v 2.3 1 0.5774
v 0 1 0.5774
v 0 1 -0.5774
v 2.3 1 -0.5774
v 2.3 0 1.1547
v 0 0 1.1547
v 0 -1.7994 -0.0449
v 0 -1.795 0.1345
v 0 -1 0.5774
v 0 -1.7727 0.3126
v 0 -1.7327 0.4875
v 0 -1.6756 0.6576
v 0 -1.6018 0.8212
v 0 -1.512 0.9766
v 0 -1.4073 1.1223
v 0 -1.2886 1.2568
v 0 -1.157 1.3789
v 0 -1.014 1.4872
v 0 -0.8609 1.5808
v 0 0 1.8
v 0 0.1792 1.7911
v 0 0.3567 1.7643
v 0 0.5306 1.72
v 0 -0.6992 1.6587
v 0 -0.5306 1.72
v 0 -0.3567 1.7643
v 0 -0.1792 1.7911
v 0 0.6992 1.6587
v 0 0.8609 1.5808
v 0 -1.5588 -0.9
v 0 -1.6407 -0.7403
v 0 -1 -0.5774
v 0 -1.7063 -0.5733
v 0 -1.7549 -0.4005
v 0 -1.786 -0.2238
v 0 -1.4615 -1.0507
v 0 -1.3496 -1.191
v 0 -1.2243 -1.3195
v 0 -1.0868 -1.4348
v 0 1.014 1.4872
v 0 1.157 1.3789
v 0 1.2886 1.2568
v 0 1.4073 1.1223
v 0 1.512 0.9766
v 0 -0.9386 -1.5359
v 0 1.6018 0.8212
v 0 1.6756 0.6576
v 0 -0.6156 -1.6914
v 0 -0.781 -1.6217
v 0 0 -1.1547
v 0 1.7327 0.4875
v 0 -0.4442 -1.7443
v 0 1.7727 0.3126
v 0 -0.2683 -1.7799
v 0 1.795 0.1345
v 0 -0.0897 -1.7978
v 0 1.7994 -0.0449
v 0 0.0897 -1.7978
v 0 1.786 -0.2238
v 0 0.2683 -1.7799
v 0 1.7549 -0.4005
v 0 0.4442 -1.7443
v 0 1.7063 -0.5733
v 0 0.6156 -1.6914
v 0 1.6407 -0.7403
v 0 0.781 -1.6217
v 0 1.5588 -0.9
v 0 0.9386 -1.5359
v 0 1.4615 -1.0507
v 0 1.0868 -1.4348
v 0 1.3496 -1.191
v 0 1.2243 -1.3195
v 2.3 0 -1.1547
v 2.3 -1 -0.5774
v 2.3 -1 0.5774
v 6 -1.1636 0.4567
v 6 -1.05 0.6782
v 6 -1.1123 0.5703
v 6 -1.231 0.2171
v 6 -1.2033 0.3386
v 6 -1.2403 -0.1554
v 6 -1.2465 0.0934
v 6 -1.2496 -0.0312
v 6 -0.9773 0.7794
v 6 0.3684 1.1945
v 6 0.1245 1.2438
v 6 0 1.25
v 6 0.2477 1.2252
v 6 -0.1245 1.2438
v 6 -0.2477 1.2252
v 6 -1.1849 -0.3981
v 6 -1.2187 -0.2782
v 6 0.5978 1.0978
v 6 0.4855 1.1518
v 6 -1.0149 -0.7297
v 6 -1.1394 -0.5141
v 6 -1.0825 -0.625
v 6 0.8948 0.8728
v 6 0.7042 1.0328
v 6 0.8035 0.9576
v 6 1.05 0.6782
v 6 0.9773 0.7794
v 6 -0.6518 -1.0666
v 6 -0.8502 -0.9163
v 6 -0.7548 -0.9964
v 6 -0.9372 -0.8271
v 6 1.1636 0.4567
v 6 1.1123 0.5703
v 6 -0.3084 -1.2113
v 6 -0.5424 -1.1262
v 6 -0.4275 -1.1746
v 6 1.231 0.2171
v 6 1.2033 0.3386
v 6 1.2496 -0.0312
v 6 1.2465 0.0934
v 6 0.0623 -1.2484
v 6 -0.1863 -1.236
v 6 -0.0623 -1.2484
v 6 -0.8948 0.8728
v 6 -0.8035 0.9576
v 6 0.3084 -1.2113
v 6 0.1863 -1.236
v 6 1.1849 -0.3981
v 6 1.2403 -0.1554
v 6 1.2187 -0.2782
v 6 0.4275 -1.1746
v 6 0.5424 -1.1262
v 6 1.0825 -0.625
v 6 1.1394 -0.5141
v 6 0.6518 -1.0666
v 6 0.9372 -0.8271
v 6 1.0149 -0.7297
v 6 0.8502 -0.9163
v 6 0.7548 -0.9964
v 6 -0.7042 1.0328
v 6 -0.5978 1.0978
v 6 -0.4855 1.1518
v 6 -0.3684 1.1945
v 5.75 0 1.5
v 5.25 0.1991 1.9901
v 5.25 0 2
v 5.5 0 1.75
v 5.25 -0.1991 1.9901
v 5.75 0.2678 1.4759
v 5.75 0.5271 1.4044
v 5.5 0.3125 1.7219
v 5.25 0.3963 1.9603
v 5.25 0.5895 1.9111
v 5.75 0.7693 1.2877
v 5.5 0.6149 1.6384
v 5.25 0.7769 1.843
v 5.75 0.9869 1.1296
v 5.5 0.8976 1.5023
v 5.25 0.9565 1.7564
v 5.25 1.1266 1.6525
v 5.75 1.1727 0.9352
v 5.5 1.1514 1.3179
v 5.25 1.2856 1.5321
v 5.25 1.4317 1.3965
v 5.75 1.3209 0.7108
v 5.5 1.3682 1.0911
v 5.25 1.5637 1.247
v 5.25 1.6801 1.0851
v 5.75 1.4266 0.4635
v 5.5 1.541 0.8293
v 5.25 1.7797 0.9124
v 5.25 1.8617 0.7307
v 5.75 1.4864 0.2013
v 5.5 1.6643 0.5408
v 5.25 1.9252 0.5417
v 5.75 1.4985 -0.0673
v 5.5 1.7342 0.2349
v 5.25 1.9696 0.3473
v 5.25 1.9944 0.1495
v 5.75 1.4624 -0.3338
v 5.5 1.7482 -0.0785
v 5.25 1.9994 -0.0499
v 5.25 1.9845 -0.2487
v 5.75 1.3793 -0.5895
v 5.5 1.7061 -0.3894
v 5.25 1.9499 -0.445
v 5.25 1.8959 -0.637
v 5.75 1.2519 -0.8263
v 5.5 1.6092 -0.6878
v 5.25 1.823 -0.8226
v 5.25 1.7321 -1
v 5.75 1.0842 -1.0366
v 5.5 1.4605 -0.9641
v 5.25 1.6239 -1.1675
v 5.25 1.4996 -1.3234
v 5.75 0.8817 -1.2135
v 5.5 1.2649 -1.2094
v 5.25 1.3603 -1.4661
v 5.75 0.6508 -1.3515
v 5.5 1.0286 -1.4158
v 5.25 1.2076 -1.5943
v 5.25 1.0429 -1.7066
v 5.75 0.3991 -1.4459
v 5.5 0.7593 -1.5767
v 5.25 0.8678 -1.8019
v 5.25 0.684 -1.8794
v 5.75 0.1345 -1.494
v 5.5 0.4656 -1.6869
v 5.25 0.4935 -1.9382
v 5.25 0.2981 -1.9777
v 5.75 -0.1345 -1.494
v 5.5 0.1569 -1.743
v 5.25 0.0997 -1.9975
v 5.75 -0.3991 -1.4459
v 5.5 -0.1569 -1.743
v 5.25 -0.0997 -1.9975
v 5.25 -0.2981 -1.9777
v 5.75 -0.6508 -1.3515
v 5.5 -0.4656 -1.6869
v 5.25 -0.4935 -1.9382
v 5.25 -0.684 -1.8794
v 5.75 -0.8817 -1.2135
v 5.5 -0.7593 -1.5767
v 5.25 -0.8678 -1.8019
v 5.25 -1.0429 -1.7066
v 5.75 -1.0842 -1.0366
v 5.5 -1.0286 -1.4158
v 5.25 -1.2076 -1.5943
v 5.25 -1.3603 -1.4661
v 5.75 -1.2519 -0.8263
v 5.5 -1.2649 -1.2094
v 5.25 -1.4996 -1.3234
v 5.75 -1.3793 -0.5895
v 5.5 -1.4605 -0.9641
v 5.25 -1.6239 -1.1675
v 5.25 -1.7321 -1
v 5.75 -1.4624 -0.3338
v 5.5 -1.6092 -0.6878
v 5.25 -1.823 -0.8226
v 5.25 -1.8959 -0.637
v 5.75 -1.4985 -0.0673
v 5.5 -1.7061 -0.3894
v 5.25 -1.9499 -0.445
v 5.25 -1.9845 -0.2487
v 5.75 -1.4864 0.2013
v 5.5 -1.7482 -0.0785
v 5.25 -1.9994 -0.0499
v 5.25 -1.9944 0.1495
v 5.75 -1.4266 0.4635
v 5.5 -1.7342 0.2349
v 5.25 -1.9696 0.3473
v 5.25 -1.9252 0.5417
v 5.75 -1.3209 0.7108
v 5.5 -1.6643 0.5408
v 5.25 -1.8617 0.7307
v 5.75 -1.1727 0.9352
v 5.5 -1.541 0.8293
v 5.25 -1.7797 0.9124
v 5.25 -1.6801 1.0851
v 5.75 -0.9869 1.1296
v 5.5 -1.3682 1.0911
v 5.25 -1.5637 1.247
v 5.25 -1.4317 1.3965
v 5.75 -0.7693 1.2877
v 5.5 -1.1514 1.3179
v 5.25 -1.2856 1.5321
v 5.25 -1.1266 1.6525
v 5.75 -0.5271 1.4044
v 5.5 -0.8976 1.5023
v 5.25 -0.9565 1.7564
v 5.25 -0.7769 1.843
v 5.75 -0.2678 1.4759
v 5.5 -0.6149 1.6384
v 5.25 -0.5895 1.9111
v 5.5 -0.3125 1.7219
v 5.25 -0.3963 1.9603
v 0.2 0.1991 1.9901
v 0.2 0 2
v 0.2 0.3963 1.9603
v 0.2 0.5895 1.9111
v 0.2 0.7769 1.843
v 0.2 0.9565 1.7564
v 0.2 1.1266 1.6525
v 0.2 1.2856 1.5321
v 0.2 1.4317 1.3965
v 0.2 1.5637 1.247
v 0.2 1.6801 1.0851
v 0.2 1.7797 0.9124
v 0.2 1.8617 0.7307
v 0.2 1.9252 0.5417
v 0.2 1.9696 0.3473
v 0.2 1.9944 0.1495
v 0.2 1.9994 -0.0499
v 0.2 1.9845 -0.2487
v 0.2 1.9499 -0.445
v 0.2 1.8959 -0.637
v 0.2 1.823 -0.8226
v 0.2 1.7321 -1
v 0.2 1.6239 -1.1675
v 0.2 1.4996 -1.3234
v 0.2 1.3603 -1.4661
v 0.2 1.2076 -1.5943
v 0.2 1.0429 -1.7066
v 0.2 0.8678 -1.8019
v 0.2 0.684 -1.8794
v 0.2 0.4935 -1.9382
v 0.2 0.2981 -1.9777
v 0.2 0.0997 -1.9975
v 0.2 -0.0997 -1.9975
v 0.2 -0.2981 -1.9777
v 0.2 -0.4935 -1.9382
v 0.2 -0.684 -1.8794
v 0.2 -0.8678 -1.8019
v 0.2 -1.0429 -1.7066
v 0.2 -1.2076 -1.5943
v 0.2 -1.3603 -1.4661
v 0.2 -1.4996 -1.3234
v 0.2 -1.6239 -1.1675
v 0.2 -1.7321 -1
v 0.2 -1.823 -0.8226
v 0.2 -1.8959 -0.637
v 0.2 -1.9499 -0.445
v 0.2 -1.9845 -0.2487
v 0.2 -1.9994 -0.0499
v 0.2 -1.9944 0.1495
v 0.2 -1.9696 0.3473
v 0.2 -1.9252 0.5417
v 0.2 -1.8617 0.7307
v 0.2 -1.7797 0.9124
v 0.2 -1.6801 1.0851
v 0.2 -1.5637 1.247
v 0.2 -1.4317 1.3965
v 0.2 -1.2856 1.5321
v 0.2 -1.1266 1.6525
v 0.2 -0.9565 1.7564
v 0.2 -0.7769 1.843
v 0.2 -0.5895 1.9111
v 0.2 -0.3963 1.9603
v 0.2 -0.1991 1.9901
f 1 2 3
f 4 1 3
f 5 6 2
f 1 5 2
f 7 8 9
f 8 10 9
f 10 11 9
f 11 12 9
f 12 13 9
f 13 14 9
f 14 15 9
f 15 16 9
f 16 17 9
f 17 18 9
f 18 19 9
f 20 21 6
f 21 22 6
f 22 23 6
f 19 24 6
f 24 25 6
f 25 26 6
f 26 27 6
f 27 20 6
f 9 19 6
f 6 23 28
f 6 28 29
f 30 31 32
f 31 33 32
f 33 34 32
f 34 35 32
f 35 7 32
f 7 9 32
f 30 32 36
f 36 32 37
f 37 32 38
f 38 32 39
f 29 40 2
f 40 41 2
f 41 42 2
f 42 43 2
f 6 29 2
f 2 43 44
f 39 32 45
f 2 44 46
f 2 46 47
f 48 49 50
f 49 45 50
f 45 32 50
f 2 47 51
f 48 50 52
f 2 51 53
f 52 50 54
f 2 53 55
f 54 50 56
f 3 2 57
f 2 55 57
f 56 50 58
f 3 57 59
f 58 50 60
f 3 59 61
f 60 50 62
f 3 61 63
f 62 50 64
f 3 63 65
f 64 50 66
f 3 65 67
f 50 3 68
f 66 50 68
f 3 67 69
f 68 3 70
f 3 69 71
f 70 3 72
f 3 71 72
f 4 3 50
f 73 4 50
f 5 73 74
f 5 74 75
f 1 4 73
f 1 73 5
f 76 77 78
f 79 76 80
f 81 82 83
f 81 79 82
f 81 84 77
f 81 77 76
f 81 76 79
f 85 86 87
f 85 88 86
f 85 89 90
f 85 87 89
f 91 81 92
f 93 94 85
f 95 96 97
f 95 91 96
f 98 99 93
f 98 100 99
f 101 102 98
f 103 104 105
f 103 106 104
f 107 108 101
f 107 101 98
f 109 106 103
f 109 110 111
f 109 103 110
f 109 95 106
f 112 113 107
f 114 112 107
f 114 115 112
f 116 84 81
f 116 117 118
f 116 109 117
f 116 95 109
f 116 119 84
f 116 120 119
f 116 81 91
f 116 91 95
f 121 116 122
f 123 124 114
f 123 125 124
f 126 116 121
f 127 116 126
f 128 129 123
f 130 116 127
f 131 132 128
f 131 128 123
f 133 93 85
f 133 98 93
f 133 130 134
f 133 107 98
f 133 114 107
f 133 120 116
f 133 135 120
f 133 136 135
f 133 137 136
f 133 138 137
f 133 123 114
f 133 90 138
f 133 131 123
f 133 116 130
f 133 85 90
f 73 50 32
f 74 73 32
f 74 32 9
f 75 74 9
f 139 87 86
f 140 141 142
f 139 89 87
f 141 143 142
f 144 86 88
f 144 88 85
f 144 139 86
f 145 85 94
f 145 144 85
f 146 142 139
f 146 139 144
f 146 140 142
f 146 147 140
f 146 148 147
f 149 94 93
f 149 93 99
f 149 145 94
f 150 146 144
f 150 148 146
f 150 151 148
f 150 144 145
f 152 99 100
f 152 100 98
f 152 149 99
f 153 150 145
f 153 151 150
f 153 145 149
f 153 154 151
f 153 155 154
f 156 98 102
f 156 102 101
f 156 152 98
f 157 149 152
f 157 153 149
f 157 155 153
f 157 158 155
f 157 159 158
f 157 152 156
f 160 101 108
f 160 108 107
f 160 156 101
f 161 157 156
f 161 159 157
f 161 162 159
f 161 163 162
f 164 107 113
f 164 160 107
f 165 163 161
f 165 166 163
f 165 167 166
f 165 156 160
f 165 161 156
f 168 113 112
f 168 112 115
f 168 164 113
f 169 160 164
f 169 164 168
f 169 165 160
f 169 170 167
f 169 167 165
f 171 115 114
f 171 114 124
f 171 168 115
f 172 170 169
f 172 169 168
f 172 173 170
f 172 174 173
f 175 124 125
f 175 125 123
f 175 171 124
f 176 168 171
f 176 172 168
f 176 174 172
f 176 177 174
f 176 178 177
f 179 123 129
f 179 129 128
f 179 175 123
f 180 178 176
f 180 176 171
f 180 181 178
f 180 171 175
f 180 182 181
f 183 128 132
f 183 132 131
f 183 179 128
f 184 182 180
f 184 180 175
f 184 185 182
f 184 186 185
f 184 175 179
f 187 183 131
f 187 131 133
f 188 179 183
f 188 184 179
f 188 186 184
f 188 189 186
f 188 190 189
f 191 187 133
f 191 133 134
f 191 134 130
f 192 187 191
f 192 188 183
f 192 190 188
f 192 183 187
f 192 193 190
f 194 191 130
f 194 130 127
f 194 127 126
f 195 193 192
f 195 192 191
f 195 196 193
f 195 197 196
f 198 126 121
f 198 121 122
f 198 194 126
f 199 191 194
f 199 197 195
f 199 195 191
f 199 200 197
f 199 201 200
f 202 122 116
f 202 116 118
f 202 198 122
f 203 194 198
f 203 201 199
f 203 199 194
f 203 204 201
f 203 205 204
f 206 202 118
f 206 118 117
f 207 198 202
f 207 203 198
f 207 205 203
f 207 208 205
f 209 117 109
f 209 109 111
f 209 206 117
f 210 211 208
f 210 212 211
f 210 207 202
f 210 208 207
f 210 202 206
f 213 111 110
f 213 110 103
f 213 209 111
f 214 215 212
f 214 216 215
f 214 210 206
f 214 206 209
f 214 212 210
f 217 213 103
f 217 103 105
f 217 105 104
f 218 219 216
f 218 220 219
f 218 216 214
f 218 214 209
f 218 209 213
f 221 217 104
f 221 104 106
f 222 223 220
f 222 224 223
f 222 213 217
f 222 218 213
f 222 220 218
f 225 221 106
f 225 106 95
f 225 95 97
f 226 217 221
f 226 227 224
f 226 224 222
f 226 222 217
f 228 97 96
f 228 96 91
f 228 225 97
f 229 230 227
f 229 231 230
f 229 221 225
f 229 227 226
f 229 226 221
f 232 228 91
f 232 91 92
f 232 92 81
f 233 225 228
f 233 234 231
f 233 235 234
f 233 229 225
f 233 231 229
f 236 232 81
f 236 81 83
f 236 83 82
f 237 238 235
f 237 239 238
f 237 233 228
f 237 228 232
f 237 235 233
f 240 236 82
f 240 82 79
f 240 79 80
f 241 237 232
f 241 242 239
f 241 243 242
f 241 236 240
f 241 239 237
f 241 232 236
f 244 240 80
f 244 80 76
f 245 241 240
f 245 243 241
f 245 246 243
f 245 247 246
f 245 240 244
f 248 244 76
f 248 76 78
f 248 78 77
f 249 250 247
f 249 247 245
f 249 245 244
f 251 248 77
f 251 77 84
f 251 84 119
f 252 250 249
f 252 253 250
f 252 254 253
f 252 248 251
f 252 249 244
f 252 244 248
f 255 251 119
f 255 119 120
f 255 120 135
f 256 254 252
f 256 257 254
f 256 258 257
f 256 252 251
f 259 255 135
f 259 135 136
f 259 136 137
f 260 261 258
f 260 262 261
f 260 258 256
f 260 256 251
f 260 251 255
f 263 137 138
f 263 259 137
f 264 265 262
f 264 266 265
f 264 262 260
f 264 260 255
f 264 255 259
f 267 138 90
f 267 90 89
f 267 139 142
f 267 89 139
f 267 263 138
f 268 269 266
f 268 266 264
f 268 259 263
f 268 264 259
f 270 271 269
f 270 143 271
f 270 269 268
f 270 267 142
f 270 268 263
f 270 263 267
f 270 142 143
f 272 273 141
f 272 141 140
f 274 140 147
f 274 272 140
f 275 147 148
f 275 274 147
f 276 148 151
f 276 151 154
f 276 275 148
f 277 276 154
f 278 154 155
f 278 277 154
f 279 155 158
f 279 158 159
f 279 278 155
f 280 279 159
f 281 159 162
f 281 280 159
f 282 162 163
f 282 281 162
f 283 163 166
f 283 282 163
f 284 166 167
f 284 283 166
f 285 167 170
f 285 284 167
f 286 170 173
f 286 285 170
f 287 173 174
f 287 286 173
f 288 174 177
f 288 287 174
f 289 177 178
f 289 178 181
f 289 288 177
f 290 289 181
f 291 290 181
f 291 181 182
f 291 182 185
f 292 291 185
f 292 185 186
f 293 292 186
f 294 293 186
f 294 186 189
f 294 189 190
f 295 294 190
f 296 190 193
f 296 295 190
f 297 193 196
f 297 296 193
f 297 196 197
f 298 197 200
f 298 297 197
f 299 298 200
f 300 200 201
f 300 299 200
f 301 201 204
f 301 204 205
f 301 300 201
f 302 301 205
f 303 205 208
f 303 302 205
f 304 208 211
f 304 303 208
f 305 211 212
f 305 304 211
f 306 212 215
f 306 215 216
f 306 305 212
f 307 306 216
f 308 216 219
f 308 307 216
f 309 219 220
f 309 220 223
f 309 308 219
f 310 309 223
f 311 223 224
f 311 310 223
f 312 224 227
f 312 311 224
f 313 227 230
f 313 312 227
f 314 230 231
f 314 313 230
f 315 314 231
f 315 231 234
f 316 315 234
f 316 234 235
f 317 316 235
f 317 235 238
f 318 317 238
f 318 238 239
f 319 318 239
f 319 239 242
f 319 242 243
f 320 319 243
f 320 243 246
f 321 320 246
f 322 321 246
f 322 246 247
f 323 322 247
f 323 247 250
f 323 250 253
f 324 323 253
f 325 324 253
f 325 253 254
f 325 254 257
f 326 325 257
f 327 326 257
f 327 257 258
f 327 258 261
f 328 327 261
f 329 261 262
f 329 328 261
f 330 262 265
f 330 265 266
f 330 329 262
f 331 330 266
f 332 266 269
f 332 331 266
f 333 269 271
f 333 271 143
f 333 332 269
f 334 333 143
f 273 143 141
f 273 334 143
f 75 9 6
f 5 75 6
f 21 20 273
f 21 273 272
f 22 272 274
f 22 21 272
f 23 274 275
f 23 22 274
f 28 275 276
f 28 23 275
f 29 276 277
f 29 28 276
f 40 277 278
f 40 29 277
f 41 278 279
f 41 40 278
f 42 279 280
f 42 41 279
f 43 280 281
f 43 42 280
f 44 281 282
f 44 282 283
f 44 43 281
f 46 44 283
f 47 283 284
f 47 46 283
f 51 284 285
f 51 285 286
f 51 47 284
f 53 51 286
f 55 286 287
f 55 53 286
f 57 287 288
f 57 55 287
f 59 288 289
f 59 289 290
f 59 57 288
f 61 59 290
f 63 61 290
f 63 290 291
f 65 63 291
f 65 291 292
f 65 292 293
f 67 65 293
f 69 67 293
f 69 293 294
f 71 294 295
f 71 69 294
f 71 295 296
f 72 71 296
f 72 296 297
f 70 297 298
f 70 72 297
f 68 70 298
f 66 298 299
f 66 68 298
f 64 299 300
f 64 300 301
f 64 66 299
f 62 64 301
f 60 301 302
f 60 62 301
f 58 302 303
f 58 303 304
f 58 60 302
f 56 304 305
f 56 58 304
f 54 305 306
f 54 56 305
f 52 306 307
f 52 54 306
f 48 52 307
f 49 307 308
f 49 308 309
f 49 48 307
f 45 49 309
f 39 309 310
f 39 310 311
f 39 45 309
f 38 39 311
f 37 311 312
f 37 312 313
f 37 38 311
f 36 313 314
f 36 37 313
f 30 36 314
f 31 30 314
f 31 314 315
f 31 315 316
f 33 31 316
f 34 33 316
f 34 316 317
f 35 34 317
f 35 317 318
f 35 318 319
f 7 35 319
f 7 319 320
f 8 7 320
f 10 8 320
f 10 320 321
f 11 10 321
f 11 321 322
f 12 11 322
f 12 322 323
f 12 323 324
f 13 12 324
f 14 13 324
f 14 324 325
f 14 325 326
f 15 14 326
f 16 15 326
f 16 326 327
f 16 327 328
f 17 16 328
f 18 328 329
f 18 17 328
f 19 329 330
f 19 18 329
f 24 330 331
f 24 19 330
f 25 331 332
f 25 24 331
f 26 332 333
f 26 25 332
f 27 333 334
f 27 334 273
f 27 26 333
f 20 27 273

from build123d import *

# Parameters (mm, degrees)
SKETCH1_W          = 6
SKETCH1_H          = 2
CUT_EXTRUDE1_DEPTH = 2.3
CHAMFER1_SIZE      = 0.75
CHAMFER2_SIZE      = 0.2


with BuildPart() as part:
    # Sketch1 → Revolve1 (revolve)
    with BuildSketch(Plane(origin=(0, 0, 0), x_dir=(-1, 0, 0), z_dir=(0, 0, -1)), mode=Mode.PRIVATE) as revolve1_sk:
        with Locations((-3, 1)):
            Rectangle(SKETCH1_W, SKETCH1_H)
    revolve(revolve1_sk.sketch.rotate(Axis((6, 0, 0), (-1, 0, 0)), 270), axis=Axis((6, 0, 0), (-1, 0, 0)))

    # Sketch2 → Cut-Extrude1 (cut)
    with BuildSketch(Plane.ZY):
        Polygon((0.577350269, -1), (1.154700538, 0), (0.577350269, 1), (-0.577350269, 1), (-1.154700538, 0), (-0.577350269, -1), align=None)
    extrude(amount=-CUT_EXTRUDE1_DEPTH, mode=Mode.SUBTRACT)

    # Chamfer1
    chamfer1_edges = [part.edges().sort_by_distance(p)[0] for p in [
        (6, 0, -2),
    ]]
    chamfer(chamfer1_edges, length=CHAMFER1_SIZE)

    # Chamfer2
    chamfer2_edges = [part.edges().sort_by_distance(p)[0] for p in [
        (0, 0, -2),
    ]]
    chamfer(chamfer2_edges, length=CHAMFER2_SIZE)


solid = part.part
